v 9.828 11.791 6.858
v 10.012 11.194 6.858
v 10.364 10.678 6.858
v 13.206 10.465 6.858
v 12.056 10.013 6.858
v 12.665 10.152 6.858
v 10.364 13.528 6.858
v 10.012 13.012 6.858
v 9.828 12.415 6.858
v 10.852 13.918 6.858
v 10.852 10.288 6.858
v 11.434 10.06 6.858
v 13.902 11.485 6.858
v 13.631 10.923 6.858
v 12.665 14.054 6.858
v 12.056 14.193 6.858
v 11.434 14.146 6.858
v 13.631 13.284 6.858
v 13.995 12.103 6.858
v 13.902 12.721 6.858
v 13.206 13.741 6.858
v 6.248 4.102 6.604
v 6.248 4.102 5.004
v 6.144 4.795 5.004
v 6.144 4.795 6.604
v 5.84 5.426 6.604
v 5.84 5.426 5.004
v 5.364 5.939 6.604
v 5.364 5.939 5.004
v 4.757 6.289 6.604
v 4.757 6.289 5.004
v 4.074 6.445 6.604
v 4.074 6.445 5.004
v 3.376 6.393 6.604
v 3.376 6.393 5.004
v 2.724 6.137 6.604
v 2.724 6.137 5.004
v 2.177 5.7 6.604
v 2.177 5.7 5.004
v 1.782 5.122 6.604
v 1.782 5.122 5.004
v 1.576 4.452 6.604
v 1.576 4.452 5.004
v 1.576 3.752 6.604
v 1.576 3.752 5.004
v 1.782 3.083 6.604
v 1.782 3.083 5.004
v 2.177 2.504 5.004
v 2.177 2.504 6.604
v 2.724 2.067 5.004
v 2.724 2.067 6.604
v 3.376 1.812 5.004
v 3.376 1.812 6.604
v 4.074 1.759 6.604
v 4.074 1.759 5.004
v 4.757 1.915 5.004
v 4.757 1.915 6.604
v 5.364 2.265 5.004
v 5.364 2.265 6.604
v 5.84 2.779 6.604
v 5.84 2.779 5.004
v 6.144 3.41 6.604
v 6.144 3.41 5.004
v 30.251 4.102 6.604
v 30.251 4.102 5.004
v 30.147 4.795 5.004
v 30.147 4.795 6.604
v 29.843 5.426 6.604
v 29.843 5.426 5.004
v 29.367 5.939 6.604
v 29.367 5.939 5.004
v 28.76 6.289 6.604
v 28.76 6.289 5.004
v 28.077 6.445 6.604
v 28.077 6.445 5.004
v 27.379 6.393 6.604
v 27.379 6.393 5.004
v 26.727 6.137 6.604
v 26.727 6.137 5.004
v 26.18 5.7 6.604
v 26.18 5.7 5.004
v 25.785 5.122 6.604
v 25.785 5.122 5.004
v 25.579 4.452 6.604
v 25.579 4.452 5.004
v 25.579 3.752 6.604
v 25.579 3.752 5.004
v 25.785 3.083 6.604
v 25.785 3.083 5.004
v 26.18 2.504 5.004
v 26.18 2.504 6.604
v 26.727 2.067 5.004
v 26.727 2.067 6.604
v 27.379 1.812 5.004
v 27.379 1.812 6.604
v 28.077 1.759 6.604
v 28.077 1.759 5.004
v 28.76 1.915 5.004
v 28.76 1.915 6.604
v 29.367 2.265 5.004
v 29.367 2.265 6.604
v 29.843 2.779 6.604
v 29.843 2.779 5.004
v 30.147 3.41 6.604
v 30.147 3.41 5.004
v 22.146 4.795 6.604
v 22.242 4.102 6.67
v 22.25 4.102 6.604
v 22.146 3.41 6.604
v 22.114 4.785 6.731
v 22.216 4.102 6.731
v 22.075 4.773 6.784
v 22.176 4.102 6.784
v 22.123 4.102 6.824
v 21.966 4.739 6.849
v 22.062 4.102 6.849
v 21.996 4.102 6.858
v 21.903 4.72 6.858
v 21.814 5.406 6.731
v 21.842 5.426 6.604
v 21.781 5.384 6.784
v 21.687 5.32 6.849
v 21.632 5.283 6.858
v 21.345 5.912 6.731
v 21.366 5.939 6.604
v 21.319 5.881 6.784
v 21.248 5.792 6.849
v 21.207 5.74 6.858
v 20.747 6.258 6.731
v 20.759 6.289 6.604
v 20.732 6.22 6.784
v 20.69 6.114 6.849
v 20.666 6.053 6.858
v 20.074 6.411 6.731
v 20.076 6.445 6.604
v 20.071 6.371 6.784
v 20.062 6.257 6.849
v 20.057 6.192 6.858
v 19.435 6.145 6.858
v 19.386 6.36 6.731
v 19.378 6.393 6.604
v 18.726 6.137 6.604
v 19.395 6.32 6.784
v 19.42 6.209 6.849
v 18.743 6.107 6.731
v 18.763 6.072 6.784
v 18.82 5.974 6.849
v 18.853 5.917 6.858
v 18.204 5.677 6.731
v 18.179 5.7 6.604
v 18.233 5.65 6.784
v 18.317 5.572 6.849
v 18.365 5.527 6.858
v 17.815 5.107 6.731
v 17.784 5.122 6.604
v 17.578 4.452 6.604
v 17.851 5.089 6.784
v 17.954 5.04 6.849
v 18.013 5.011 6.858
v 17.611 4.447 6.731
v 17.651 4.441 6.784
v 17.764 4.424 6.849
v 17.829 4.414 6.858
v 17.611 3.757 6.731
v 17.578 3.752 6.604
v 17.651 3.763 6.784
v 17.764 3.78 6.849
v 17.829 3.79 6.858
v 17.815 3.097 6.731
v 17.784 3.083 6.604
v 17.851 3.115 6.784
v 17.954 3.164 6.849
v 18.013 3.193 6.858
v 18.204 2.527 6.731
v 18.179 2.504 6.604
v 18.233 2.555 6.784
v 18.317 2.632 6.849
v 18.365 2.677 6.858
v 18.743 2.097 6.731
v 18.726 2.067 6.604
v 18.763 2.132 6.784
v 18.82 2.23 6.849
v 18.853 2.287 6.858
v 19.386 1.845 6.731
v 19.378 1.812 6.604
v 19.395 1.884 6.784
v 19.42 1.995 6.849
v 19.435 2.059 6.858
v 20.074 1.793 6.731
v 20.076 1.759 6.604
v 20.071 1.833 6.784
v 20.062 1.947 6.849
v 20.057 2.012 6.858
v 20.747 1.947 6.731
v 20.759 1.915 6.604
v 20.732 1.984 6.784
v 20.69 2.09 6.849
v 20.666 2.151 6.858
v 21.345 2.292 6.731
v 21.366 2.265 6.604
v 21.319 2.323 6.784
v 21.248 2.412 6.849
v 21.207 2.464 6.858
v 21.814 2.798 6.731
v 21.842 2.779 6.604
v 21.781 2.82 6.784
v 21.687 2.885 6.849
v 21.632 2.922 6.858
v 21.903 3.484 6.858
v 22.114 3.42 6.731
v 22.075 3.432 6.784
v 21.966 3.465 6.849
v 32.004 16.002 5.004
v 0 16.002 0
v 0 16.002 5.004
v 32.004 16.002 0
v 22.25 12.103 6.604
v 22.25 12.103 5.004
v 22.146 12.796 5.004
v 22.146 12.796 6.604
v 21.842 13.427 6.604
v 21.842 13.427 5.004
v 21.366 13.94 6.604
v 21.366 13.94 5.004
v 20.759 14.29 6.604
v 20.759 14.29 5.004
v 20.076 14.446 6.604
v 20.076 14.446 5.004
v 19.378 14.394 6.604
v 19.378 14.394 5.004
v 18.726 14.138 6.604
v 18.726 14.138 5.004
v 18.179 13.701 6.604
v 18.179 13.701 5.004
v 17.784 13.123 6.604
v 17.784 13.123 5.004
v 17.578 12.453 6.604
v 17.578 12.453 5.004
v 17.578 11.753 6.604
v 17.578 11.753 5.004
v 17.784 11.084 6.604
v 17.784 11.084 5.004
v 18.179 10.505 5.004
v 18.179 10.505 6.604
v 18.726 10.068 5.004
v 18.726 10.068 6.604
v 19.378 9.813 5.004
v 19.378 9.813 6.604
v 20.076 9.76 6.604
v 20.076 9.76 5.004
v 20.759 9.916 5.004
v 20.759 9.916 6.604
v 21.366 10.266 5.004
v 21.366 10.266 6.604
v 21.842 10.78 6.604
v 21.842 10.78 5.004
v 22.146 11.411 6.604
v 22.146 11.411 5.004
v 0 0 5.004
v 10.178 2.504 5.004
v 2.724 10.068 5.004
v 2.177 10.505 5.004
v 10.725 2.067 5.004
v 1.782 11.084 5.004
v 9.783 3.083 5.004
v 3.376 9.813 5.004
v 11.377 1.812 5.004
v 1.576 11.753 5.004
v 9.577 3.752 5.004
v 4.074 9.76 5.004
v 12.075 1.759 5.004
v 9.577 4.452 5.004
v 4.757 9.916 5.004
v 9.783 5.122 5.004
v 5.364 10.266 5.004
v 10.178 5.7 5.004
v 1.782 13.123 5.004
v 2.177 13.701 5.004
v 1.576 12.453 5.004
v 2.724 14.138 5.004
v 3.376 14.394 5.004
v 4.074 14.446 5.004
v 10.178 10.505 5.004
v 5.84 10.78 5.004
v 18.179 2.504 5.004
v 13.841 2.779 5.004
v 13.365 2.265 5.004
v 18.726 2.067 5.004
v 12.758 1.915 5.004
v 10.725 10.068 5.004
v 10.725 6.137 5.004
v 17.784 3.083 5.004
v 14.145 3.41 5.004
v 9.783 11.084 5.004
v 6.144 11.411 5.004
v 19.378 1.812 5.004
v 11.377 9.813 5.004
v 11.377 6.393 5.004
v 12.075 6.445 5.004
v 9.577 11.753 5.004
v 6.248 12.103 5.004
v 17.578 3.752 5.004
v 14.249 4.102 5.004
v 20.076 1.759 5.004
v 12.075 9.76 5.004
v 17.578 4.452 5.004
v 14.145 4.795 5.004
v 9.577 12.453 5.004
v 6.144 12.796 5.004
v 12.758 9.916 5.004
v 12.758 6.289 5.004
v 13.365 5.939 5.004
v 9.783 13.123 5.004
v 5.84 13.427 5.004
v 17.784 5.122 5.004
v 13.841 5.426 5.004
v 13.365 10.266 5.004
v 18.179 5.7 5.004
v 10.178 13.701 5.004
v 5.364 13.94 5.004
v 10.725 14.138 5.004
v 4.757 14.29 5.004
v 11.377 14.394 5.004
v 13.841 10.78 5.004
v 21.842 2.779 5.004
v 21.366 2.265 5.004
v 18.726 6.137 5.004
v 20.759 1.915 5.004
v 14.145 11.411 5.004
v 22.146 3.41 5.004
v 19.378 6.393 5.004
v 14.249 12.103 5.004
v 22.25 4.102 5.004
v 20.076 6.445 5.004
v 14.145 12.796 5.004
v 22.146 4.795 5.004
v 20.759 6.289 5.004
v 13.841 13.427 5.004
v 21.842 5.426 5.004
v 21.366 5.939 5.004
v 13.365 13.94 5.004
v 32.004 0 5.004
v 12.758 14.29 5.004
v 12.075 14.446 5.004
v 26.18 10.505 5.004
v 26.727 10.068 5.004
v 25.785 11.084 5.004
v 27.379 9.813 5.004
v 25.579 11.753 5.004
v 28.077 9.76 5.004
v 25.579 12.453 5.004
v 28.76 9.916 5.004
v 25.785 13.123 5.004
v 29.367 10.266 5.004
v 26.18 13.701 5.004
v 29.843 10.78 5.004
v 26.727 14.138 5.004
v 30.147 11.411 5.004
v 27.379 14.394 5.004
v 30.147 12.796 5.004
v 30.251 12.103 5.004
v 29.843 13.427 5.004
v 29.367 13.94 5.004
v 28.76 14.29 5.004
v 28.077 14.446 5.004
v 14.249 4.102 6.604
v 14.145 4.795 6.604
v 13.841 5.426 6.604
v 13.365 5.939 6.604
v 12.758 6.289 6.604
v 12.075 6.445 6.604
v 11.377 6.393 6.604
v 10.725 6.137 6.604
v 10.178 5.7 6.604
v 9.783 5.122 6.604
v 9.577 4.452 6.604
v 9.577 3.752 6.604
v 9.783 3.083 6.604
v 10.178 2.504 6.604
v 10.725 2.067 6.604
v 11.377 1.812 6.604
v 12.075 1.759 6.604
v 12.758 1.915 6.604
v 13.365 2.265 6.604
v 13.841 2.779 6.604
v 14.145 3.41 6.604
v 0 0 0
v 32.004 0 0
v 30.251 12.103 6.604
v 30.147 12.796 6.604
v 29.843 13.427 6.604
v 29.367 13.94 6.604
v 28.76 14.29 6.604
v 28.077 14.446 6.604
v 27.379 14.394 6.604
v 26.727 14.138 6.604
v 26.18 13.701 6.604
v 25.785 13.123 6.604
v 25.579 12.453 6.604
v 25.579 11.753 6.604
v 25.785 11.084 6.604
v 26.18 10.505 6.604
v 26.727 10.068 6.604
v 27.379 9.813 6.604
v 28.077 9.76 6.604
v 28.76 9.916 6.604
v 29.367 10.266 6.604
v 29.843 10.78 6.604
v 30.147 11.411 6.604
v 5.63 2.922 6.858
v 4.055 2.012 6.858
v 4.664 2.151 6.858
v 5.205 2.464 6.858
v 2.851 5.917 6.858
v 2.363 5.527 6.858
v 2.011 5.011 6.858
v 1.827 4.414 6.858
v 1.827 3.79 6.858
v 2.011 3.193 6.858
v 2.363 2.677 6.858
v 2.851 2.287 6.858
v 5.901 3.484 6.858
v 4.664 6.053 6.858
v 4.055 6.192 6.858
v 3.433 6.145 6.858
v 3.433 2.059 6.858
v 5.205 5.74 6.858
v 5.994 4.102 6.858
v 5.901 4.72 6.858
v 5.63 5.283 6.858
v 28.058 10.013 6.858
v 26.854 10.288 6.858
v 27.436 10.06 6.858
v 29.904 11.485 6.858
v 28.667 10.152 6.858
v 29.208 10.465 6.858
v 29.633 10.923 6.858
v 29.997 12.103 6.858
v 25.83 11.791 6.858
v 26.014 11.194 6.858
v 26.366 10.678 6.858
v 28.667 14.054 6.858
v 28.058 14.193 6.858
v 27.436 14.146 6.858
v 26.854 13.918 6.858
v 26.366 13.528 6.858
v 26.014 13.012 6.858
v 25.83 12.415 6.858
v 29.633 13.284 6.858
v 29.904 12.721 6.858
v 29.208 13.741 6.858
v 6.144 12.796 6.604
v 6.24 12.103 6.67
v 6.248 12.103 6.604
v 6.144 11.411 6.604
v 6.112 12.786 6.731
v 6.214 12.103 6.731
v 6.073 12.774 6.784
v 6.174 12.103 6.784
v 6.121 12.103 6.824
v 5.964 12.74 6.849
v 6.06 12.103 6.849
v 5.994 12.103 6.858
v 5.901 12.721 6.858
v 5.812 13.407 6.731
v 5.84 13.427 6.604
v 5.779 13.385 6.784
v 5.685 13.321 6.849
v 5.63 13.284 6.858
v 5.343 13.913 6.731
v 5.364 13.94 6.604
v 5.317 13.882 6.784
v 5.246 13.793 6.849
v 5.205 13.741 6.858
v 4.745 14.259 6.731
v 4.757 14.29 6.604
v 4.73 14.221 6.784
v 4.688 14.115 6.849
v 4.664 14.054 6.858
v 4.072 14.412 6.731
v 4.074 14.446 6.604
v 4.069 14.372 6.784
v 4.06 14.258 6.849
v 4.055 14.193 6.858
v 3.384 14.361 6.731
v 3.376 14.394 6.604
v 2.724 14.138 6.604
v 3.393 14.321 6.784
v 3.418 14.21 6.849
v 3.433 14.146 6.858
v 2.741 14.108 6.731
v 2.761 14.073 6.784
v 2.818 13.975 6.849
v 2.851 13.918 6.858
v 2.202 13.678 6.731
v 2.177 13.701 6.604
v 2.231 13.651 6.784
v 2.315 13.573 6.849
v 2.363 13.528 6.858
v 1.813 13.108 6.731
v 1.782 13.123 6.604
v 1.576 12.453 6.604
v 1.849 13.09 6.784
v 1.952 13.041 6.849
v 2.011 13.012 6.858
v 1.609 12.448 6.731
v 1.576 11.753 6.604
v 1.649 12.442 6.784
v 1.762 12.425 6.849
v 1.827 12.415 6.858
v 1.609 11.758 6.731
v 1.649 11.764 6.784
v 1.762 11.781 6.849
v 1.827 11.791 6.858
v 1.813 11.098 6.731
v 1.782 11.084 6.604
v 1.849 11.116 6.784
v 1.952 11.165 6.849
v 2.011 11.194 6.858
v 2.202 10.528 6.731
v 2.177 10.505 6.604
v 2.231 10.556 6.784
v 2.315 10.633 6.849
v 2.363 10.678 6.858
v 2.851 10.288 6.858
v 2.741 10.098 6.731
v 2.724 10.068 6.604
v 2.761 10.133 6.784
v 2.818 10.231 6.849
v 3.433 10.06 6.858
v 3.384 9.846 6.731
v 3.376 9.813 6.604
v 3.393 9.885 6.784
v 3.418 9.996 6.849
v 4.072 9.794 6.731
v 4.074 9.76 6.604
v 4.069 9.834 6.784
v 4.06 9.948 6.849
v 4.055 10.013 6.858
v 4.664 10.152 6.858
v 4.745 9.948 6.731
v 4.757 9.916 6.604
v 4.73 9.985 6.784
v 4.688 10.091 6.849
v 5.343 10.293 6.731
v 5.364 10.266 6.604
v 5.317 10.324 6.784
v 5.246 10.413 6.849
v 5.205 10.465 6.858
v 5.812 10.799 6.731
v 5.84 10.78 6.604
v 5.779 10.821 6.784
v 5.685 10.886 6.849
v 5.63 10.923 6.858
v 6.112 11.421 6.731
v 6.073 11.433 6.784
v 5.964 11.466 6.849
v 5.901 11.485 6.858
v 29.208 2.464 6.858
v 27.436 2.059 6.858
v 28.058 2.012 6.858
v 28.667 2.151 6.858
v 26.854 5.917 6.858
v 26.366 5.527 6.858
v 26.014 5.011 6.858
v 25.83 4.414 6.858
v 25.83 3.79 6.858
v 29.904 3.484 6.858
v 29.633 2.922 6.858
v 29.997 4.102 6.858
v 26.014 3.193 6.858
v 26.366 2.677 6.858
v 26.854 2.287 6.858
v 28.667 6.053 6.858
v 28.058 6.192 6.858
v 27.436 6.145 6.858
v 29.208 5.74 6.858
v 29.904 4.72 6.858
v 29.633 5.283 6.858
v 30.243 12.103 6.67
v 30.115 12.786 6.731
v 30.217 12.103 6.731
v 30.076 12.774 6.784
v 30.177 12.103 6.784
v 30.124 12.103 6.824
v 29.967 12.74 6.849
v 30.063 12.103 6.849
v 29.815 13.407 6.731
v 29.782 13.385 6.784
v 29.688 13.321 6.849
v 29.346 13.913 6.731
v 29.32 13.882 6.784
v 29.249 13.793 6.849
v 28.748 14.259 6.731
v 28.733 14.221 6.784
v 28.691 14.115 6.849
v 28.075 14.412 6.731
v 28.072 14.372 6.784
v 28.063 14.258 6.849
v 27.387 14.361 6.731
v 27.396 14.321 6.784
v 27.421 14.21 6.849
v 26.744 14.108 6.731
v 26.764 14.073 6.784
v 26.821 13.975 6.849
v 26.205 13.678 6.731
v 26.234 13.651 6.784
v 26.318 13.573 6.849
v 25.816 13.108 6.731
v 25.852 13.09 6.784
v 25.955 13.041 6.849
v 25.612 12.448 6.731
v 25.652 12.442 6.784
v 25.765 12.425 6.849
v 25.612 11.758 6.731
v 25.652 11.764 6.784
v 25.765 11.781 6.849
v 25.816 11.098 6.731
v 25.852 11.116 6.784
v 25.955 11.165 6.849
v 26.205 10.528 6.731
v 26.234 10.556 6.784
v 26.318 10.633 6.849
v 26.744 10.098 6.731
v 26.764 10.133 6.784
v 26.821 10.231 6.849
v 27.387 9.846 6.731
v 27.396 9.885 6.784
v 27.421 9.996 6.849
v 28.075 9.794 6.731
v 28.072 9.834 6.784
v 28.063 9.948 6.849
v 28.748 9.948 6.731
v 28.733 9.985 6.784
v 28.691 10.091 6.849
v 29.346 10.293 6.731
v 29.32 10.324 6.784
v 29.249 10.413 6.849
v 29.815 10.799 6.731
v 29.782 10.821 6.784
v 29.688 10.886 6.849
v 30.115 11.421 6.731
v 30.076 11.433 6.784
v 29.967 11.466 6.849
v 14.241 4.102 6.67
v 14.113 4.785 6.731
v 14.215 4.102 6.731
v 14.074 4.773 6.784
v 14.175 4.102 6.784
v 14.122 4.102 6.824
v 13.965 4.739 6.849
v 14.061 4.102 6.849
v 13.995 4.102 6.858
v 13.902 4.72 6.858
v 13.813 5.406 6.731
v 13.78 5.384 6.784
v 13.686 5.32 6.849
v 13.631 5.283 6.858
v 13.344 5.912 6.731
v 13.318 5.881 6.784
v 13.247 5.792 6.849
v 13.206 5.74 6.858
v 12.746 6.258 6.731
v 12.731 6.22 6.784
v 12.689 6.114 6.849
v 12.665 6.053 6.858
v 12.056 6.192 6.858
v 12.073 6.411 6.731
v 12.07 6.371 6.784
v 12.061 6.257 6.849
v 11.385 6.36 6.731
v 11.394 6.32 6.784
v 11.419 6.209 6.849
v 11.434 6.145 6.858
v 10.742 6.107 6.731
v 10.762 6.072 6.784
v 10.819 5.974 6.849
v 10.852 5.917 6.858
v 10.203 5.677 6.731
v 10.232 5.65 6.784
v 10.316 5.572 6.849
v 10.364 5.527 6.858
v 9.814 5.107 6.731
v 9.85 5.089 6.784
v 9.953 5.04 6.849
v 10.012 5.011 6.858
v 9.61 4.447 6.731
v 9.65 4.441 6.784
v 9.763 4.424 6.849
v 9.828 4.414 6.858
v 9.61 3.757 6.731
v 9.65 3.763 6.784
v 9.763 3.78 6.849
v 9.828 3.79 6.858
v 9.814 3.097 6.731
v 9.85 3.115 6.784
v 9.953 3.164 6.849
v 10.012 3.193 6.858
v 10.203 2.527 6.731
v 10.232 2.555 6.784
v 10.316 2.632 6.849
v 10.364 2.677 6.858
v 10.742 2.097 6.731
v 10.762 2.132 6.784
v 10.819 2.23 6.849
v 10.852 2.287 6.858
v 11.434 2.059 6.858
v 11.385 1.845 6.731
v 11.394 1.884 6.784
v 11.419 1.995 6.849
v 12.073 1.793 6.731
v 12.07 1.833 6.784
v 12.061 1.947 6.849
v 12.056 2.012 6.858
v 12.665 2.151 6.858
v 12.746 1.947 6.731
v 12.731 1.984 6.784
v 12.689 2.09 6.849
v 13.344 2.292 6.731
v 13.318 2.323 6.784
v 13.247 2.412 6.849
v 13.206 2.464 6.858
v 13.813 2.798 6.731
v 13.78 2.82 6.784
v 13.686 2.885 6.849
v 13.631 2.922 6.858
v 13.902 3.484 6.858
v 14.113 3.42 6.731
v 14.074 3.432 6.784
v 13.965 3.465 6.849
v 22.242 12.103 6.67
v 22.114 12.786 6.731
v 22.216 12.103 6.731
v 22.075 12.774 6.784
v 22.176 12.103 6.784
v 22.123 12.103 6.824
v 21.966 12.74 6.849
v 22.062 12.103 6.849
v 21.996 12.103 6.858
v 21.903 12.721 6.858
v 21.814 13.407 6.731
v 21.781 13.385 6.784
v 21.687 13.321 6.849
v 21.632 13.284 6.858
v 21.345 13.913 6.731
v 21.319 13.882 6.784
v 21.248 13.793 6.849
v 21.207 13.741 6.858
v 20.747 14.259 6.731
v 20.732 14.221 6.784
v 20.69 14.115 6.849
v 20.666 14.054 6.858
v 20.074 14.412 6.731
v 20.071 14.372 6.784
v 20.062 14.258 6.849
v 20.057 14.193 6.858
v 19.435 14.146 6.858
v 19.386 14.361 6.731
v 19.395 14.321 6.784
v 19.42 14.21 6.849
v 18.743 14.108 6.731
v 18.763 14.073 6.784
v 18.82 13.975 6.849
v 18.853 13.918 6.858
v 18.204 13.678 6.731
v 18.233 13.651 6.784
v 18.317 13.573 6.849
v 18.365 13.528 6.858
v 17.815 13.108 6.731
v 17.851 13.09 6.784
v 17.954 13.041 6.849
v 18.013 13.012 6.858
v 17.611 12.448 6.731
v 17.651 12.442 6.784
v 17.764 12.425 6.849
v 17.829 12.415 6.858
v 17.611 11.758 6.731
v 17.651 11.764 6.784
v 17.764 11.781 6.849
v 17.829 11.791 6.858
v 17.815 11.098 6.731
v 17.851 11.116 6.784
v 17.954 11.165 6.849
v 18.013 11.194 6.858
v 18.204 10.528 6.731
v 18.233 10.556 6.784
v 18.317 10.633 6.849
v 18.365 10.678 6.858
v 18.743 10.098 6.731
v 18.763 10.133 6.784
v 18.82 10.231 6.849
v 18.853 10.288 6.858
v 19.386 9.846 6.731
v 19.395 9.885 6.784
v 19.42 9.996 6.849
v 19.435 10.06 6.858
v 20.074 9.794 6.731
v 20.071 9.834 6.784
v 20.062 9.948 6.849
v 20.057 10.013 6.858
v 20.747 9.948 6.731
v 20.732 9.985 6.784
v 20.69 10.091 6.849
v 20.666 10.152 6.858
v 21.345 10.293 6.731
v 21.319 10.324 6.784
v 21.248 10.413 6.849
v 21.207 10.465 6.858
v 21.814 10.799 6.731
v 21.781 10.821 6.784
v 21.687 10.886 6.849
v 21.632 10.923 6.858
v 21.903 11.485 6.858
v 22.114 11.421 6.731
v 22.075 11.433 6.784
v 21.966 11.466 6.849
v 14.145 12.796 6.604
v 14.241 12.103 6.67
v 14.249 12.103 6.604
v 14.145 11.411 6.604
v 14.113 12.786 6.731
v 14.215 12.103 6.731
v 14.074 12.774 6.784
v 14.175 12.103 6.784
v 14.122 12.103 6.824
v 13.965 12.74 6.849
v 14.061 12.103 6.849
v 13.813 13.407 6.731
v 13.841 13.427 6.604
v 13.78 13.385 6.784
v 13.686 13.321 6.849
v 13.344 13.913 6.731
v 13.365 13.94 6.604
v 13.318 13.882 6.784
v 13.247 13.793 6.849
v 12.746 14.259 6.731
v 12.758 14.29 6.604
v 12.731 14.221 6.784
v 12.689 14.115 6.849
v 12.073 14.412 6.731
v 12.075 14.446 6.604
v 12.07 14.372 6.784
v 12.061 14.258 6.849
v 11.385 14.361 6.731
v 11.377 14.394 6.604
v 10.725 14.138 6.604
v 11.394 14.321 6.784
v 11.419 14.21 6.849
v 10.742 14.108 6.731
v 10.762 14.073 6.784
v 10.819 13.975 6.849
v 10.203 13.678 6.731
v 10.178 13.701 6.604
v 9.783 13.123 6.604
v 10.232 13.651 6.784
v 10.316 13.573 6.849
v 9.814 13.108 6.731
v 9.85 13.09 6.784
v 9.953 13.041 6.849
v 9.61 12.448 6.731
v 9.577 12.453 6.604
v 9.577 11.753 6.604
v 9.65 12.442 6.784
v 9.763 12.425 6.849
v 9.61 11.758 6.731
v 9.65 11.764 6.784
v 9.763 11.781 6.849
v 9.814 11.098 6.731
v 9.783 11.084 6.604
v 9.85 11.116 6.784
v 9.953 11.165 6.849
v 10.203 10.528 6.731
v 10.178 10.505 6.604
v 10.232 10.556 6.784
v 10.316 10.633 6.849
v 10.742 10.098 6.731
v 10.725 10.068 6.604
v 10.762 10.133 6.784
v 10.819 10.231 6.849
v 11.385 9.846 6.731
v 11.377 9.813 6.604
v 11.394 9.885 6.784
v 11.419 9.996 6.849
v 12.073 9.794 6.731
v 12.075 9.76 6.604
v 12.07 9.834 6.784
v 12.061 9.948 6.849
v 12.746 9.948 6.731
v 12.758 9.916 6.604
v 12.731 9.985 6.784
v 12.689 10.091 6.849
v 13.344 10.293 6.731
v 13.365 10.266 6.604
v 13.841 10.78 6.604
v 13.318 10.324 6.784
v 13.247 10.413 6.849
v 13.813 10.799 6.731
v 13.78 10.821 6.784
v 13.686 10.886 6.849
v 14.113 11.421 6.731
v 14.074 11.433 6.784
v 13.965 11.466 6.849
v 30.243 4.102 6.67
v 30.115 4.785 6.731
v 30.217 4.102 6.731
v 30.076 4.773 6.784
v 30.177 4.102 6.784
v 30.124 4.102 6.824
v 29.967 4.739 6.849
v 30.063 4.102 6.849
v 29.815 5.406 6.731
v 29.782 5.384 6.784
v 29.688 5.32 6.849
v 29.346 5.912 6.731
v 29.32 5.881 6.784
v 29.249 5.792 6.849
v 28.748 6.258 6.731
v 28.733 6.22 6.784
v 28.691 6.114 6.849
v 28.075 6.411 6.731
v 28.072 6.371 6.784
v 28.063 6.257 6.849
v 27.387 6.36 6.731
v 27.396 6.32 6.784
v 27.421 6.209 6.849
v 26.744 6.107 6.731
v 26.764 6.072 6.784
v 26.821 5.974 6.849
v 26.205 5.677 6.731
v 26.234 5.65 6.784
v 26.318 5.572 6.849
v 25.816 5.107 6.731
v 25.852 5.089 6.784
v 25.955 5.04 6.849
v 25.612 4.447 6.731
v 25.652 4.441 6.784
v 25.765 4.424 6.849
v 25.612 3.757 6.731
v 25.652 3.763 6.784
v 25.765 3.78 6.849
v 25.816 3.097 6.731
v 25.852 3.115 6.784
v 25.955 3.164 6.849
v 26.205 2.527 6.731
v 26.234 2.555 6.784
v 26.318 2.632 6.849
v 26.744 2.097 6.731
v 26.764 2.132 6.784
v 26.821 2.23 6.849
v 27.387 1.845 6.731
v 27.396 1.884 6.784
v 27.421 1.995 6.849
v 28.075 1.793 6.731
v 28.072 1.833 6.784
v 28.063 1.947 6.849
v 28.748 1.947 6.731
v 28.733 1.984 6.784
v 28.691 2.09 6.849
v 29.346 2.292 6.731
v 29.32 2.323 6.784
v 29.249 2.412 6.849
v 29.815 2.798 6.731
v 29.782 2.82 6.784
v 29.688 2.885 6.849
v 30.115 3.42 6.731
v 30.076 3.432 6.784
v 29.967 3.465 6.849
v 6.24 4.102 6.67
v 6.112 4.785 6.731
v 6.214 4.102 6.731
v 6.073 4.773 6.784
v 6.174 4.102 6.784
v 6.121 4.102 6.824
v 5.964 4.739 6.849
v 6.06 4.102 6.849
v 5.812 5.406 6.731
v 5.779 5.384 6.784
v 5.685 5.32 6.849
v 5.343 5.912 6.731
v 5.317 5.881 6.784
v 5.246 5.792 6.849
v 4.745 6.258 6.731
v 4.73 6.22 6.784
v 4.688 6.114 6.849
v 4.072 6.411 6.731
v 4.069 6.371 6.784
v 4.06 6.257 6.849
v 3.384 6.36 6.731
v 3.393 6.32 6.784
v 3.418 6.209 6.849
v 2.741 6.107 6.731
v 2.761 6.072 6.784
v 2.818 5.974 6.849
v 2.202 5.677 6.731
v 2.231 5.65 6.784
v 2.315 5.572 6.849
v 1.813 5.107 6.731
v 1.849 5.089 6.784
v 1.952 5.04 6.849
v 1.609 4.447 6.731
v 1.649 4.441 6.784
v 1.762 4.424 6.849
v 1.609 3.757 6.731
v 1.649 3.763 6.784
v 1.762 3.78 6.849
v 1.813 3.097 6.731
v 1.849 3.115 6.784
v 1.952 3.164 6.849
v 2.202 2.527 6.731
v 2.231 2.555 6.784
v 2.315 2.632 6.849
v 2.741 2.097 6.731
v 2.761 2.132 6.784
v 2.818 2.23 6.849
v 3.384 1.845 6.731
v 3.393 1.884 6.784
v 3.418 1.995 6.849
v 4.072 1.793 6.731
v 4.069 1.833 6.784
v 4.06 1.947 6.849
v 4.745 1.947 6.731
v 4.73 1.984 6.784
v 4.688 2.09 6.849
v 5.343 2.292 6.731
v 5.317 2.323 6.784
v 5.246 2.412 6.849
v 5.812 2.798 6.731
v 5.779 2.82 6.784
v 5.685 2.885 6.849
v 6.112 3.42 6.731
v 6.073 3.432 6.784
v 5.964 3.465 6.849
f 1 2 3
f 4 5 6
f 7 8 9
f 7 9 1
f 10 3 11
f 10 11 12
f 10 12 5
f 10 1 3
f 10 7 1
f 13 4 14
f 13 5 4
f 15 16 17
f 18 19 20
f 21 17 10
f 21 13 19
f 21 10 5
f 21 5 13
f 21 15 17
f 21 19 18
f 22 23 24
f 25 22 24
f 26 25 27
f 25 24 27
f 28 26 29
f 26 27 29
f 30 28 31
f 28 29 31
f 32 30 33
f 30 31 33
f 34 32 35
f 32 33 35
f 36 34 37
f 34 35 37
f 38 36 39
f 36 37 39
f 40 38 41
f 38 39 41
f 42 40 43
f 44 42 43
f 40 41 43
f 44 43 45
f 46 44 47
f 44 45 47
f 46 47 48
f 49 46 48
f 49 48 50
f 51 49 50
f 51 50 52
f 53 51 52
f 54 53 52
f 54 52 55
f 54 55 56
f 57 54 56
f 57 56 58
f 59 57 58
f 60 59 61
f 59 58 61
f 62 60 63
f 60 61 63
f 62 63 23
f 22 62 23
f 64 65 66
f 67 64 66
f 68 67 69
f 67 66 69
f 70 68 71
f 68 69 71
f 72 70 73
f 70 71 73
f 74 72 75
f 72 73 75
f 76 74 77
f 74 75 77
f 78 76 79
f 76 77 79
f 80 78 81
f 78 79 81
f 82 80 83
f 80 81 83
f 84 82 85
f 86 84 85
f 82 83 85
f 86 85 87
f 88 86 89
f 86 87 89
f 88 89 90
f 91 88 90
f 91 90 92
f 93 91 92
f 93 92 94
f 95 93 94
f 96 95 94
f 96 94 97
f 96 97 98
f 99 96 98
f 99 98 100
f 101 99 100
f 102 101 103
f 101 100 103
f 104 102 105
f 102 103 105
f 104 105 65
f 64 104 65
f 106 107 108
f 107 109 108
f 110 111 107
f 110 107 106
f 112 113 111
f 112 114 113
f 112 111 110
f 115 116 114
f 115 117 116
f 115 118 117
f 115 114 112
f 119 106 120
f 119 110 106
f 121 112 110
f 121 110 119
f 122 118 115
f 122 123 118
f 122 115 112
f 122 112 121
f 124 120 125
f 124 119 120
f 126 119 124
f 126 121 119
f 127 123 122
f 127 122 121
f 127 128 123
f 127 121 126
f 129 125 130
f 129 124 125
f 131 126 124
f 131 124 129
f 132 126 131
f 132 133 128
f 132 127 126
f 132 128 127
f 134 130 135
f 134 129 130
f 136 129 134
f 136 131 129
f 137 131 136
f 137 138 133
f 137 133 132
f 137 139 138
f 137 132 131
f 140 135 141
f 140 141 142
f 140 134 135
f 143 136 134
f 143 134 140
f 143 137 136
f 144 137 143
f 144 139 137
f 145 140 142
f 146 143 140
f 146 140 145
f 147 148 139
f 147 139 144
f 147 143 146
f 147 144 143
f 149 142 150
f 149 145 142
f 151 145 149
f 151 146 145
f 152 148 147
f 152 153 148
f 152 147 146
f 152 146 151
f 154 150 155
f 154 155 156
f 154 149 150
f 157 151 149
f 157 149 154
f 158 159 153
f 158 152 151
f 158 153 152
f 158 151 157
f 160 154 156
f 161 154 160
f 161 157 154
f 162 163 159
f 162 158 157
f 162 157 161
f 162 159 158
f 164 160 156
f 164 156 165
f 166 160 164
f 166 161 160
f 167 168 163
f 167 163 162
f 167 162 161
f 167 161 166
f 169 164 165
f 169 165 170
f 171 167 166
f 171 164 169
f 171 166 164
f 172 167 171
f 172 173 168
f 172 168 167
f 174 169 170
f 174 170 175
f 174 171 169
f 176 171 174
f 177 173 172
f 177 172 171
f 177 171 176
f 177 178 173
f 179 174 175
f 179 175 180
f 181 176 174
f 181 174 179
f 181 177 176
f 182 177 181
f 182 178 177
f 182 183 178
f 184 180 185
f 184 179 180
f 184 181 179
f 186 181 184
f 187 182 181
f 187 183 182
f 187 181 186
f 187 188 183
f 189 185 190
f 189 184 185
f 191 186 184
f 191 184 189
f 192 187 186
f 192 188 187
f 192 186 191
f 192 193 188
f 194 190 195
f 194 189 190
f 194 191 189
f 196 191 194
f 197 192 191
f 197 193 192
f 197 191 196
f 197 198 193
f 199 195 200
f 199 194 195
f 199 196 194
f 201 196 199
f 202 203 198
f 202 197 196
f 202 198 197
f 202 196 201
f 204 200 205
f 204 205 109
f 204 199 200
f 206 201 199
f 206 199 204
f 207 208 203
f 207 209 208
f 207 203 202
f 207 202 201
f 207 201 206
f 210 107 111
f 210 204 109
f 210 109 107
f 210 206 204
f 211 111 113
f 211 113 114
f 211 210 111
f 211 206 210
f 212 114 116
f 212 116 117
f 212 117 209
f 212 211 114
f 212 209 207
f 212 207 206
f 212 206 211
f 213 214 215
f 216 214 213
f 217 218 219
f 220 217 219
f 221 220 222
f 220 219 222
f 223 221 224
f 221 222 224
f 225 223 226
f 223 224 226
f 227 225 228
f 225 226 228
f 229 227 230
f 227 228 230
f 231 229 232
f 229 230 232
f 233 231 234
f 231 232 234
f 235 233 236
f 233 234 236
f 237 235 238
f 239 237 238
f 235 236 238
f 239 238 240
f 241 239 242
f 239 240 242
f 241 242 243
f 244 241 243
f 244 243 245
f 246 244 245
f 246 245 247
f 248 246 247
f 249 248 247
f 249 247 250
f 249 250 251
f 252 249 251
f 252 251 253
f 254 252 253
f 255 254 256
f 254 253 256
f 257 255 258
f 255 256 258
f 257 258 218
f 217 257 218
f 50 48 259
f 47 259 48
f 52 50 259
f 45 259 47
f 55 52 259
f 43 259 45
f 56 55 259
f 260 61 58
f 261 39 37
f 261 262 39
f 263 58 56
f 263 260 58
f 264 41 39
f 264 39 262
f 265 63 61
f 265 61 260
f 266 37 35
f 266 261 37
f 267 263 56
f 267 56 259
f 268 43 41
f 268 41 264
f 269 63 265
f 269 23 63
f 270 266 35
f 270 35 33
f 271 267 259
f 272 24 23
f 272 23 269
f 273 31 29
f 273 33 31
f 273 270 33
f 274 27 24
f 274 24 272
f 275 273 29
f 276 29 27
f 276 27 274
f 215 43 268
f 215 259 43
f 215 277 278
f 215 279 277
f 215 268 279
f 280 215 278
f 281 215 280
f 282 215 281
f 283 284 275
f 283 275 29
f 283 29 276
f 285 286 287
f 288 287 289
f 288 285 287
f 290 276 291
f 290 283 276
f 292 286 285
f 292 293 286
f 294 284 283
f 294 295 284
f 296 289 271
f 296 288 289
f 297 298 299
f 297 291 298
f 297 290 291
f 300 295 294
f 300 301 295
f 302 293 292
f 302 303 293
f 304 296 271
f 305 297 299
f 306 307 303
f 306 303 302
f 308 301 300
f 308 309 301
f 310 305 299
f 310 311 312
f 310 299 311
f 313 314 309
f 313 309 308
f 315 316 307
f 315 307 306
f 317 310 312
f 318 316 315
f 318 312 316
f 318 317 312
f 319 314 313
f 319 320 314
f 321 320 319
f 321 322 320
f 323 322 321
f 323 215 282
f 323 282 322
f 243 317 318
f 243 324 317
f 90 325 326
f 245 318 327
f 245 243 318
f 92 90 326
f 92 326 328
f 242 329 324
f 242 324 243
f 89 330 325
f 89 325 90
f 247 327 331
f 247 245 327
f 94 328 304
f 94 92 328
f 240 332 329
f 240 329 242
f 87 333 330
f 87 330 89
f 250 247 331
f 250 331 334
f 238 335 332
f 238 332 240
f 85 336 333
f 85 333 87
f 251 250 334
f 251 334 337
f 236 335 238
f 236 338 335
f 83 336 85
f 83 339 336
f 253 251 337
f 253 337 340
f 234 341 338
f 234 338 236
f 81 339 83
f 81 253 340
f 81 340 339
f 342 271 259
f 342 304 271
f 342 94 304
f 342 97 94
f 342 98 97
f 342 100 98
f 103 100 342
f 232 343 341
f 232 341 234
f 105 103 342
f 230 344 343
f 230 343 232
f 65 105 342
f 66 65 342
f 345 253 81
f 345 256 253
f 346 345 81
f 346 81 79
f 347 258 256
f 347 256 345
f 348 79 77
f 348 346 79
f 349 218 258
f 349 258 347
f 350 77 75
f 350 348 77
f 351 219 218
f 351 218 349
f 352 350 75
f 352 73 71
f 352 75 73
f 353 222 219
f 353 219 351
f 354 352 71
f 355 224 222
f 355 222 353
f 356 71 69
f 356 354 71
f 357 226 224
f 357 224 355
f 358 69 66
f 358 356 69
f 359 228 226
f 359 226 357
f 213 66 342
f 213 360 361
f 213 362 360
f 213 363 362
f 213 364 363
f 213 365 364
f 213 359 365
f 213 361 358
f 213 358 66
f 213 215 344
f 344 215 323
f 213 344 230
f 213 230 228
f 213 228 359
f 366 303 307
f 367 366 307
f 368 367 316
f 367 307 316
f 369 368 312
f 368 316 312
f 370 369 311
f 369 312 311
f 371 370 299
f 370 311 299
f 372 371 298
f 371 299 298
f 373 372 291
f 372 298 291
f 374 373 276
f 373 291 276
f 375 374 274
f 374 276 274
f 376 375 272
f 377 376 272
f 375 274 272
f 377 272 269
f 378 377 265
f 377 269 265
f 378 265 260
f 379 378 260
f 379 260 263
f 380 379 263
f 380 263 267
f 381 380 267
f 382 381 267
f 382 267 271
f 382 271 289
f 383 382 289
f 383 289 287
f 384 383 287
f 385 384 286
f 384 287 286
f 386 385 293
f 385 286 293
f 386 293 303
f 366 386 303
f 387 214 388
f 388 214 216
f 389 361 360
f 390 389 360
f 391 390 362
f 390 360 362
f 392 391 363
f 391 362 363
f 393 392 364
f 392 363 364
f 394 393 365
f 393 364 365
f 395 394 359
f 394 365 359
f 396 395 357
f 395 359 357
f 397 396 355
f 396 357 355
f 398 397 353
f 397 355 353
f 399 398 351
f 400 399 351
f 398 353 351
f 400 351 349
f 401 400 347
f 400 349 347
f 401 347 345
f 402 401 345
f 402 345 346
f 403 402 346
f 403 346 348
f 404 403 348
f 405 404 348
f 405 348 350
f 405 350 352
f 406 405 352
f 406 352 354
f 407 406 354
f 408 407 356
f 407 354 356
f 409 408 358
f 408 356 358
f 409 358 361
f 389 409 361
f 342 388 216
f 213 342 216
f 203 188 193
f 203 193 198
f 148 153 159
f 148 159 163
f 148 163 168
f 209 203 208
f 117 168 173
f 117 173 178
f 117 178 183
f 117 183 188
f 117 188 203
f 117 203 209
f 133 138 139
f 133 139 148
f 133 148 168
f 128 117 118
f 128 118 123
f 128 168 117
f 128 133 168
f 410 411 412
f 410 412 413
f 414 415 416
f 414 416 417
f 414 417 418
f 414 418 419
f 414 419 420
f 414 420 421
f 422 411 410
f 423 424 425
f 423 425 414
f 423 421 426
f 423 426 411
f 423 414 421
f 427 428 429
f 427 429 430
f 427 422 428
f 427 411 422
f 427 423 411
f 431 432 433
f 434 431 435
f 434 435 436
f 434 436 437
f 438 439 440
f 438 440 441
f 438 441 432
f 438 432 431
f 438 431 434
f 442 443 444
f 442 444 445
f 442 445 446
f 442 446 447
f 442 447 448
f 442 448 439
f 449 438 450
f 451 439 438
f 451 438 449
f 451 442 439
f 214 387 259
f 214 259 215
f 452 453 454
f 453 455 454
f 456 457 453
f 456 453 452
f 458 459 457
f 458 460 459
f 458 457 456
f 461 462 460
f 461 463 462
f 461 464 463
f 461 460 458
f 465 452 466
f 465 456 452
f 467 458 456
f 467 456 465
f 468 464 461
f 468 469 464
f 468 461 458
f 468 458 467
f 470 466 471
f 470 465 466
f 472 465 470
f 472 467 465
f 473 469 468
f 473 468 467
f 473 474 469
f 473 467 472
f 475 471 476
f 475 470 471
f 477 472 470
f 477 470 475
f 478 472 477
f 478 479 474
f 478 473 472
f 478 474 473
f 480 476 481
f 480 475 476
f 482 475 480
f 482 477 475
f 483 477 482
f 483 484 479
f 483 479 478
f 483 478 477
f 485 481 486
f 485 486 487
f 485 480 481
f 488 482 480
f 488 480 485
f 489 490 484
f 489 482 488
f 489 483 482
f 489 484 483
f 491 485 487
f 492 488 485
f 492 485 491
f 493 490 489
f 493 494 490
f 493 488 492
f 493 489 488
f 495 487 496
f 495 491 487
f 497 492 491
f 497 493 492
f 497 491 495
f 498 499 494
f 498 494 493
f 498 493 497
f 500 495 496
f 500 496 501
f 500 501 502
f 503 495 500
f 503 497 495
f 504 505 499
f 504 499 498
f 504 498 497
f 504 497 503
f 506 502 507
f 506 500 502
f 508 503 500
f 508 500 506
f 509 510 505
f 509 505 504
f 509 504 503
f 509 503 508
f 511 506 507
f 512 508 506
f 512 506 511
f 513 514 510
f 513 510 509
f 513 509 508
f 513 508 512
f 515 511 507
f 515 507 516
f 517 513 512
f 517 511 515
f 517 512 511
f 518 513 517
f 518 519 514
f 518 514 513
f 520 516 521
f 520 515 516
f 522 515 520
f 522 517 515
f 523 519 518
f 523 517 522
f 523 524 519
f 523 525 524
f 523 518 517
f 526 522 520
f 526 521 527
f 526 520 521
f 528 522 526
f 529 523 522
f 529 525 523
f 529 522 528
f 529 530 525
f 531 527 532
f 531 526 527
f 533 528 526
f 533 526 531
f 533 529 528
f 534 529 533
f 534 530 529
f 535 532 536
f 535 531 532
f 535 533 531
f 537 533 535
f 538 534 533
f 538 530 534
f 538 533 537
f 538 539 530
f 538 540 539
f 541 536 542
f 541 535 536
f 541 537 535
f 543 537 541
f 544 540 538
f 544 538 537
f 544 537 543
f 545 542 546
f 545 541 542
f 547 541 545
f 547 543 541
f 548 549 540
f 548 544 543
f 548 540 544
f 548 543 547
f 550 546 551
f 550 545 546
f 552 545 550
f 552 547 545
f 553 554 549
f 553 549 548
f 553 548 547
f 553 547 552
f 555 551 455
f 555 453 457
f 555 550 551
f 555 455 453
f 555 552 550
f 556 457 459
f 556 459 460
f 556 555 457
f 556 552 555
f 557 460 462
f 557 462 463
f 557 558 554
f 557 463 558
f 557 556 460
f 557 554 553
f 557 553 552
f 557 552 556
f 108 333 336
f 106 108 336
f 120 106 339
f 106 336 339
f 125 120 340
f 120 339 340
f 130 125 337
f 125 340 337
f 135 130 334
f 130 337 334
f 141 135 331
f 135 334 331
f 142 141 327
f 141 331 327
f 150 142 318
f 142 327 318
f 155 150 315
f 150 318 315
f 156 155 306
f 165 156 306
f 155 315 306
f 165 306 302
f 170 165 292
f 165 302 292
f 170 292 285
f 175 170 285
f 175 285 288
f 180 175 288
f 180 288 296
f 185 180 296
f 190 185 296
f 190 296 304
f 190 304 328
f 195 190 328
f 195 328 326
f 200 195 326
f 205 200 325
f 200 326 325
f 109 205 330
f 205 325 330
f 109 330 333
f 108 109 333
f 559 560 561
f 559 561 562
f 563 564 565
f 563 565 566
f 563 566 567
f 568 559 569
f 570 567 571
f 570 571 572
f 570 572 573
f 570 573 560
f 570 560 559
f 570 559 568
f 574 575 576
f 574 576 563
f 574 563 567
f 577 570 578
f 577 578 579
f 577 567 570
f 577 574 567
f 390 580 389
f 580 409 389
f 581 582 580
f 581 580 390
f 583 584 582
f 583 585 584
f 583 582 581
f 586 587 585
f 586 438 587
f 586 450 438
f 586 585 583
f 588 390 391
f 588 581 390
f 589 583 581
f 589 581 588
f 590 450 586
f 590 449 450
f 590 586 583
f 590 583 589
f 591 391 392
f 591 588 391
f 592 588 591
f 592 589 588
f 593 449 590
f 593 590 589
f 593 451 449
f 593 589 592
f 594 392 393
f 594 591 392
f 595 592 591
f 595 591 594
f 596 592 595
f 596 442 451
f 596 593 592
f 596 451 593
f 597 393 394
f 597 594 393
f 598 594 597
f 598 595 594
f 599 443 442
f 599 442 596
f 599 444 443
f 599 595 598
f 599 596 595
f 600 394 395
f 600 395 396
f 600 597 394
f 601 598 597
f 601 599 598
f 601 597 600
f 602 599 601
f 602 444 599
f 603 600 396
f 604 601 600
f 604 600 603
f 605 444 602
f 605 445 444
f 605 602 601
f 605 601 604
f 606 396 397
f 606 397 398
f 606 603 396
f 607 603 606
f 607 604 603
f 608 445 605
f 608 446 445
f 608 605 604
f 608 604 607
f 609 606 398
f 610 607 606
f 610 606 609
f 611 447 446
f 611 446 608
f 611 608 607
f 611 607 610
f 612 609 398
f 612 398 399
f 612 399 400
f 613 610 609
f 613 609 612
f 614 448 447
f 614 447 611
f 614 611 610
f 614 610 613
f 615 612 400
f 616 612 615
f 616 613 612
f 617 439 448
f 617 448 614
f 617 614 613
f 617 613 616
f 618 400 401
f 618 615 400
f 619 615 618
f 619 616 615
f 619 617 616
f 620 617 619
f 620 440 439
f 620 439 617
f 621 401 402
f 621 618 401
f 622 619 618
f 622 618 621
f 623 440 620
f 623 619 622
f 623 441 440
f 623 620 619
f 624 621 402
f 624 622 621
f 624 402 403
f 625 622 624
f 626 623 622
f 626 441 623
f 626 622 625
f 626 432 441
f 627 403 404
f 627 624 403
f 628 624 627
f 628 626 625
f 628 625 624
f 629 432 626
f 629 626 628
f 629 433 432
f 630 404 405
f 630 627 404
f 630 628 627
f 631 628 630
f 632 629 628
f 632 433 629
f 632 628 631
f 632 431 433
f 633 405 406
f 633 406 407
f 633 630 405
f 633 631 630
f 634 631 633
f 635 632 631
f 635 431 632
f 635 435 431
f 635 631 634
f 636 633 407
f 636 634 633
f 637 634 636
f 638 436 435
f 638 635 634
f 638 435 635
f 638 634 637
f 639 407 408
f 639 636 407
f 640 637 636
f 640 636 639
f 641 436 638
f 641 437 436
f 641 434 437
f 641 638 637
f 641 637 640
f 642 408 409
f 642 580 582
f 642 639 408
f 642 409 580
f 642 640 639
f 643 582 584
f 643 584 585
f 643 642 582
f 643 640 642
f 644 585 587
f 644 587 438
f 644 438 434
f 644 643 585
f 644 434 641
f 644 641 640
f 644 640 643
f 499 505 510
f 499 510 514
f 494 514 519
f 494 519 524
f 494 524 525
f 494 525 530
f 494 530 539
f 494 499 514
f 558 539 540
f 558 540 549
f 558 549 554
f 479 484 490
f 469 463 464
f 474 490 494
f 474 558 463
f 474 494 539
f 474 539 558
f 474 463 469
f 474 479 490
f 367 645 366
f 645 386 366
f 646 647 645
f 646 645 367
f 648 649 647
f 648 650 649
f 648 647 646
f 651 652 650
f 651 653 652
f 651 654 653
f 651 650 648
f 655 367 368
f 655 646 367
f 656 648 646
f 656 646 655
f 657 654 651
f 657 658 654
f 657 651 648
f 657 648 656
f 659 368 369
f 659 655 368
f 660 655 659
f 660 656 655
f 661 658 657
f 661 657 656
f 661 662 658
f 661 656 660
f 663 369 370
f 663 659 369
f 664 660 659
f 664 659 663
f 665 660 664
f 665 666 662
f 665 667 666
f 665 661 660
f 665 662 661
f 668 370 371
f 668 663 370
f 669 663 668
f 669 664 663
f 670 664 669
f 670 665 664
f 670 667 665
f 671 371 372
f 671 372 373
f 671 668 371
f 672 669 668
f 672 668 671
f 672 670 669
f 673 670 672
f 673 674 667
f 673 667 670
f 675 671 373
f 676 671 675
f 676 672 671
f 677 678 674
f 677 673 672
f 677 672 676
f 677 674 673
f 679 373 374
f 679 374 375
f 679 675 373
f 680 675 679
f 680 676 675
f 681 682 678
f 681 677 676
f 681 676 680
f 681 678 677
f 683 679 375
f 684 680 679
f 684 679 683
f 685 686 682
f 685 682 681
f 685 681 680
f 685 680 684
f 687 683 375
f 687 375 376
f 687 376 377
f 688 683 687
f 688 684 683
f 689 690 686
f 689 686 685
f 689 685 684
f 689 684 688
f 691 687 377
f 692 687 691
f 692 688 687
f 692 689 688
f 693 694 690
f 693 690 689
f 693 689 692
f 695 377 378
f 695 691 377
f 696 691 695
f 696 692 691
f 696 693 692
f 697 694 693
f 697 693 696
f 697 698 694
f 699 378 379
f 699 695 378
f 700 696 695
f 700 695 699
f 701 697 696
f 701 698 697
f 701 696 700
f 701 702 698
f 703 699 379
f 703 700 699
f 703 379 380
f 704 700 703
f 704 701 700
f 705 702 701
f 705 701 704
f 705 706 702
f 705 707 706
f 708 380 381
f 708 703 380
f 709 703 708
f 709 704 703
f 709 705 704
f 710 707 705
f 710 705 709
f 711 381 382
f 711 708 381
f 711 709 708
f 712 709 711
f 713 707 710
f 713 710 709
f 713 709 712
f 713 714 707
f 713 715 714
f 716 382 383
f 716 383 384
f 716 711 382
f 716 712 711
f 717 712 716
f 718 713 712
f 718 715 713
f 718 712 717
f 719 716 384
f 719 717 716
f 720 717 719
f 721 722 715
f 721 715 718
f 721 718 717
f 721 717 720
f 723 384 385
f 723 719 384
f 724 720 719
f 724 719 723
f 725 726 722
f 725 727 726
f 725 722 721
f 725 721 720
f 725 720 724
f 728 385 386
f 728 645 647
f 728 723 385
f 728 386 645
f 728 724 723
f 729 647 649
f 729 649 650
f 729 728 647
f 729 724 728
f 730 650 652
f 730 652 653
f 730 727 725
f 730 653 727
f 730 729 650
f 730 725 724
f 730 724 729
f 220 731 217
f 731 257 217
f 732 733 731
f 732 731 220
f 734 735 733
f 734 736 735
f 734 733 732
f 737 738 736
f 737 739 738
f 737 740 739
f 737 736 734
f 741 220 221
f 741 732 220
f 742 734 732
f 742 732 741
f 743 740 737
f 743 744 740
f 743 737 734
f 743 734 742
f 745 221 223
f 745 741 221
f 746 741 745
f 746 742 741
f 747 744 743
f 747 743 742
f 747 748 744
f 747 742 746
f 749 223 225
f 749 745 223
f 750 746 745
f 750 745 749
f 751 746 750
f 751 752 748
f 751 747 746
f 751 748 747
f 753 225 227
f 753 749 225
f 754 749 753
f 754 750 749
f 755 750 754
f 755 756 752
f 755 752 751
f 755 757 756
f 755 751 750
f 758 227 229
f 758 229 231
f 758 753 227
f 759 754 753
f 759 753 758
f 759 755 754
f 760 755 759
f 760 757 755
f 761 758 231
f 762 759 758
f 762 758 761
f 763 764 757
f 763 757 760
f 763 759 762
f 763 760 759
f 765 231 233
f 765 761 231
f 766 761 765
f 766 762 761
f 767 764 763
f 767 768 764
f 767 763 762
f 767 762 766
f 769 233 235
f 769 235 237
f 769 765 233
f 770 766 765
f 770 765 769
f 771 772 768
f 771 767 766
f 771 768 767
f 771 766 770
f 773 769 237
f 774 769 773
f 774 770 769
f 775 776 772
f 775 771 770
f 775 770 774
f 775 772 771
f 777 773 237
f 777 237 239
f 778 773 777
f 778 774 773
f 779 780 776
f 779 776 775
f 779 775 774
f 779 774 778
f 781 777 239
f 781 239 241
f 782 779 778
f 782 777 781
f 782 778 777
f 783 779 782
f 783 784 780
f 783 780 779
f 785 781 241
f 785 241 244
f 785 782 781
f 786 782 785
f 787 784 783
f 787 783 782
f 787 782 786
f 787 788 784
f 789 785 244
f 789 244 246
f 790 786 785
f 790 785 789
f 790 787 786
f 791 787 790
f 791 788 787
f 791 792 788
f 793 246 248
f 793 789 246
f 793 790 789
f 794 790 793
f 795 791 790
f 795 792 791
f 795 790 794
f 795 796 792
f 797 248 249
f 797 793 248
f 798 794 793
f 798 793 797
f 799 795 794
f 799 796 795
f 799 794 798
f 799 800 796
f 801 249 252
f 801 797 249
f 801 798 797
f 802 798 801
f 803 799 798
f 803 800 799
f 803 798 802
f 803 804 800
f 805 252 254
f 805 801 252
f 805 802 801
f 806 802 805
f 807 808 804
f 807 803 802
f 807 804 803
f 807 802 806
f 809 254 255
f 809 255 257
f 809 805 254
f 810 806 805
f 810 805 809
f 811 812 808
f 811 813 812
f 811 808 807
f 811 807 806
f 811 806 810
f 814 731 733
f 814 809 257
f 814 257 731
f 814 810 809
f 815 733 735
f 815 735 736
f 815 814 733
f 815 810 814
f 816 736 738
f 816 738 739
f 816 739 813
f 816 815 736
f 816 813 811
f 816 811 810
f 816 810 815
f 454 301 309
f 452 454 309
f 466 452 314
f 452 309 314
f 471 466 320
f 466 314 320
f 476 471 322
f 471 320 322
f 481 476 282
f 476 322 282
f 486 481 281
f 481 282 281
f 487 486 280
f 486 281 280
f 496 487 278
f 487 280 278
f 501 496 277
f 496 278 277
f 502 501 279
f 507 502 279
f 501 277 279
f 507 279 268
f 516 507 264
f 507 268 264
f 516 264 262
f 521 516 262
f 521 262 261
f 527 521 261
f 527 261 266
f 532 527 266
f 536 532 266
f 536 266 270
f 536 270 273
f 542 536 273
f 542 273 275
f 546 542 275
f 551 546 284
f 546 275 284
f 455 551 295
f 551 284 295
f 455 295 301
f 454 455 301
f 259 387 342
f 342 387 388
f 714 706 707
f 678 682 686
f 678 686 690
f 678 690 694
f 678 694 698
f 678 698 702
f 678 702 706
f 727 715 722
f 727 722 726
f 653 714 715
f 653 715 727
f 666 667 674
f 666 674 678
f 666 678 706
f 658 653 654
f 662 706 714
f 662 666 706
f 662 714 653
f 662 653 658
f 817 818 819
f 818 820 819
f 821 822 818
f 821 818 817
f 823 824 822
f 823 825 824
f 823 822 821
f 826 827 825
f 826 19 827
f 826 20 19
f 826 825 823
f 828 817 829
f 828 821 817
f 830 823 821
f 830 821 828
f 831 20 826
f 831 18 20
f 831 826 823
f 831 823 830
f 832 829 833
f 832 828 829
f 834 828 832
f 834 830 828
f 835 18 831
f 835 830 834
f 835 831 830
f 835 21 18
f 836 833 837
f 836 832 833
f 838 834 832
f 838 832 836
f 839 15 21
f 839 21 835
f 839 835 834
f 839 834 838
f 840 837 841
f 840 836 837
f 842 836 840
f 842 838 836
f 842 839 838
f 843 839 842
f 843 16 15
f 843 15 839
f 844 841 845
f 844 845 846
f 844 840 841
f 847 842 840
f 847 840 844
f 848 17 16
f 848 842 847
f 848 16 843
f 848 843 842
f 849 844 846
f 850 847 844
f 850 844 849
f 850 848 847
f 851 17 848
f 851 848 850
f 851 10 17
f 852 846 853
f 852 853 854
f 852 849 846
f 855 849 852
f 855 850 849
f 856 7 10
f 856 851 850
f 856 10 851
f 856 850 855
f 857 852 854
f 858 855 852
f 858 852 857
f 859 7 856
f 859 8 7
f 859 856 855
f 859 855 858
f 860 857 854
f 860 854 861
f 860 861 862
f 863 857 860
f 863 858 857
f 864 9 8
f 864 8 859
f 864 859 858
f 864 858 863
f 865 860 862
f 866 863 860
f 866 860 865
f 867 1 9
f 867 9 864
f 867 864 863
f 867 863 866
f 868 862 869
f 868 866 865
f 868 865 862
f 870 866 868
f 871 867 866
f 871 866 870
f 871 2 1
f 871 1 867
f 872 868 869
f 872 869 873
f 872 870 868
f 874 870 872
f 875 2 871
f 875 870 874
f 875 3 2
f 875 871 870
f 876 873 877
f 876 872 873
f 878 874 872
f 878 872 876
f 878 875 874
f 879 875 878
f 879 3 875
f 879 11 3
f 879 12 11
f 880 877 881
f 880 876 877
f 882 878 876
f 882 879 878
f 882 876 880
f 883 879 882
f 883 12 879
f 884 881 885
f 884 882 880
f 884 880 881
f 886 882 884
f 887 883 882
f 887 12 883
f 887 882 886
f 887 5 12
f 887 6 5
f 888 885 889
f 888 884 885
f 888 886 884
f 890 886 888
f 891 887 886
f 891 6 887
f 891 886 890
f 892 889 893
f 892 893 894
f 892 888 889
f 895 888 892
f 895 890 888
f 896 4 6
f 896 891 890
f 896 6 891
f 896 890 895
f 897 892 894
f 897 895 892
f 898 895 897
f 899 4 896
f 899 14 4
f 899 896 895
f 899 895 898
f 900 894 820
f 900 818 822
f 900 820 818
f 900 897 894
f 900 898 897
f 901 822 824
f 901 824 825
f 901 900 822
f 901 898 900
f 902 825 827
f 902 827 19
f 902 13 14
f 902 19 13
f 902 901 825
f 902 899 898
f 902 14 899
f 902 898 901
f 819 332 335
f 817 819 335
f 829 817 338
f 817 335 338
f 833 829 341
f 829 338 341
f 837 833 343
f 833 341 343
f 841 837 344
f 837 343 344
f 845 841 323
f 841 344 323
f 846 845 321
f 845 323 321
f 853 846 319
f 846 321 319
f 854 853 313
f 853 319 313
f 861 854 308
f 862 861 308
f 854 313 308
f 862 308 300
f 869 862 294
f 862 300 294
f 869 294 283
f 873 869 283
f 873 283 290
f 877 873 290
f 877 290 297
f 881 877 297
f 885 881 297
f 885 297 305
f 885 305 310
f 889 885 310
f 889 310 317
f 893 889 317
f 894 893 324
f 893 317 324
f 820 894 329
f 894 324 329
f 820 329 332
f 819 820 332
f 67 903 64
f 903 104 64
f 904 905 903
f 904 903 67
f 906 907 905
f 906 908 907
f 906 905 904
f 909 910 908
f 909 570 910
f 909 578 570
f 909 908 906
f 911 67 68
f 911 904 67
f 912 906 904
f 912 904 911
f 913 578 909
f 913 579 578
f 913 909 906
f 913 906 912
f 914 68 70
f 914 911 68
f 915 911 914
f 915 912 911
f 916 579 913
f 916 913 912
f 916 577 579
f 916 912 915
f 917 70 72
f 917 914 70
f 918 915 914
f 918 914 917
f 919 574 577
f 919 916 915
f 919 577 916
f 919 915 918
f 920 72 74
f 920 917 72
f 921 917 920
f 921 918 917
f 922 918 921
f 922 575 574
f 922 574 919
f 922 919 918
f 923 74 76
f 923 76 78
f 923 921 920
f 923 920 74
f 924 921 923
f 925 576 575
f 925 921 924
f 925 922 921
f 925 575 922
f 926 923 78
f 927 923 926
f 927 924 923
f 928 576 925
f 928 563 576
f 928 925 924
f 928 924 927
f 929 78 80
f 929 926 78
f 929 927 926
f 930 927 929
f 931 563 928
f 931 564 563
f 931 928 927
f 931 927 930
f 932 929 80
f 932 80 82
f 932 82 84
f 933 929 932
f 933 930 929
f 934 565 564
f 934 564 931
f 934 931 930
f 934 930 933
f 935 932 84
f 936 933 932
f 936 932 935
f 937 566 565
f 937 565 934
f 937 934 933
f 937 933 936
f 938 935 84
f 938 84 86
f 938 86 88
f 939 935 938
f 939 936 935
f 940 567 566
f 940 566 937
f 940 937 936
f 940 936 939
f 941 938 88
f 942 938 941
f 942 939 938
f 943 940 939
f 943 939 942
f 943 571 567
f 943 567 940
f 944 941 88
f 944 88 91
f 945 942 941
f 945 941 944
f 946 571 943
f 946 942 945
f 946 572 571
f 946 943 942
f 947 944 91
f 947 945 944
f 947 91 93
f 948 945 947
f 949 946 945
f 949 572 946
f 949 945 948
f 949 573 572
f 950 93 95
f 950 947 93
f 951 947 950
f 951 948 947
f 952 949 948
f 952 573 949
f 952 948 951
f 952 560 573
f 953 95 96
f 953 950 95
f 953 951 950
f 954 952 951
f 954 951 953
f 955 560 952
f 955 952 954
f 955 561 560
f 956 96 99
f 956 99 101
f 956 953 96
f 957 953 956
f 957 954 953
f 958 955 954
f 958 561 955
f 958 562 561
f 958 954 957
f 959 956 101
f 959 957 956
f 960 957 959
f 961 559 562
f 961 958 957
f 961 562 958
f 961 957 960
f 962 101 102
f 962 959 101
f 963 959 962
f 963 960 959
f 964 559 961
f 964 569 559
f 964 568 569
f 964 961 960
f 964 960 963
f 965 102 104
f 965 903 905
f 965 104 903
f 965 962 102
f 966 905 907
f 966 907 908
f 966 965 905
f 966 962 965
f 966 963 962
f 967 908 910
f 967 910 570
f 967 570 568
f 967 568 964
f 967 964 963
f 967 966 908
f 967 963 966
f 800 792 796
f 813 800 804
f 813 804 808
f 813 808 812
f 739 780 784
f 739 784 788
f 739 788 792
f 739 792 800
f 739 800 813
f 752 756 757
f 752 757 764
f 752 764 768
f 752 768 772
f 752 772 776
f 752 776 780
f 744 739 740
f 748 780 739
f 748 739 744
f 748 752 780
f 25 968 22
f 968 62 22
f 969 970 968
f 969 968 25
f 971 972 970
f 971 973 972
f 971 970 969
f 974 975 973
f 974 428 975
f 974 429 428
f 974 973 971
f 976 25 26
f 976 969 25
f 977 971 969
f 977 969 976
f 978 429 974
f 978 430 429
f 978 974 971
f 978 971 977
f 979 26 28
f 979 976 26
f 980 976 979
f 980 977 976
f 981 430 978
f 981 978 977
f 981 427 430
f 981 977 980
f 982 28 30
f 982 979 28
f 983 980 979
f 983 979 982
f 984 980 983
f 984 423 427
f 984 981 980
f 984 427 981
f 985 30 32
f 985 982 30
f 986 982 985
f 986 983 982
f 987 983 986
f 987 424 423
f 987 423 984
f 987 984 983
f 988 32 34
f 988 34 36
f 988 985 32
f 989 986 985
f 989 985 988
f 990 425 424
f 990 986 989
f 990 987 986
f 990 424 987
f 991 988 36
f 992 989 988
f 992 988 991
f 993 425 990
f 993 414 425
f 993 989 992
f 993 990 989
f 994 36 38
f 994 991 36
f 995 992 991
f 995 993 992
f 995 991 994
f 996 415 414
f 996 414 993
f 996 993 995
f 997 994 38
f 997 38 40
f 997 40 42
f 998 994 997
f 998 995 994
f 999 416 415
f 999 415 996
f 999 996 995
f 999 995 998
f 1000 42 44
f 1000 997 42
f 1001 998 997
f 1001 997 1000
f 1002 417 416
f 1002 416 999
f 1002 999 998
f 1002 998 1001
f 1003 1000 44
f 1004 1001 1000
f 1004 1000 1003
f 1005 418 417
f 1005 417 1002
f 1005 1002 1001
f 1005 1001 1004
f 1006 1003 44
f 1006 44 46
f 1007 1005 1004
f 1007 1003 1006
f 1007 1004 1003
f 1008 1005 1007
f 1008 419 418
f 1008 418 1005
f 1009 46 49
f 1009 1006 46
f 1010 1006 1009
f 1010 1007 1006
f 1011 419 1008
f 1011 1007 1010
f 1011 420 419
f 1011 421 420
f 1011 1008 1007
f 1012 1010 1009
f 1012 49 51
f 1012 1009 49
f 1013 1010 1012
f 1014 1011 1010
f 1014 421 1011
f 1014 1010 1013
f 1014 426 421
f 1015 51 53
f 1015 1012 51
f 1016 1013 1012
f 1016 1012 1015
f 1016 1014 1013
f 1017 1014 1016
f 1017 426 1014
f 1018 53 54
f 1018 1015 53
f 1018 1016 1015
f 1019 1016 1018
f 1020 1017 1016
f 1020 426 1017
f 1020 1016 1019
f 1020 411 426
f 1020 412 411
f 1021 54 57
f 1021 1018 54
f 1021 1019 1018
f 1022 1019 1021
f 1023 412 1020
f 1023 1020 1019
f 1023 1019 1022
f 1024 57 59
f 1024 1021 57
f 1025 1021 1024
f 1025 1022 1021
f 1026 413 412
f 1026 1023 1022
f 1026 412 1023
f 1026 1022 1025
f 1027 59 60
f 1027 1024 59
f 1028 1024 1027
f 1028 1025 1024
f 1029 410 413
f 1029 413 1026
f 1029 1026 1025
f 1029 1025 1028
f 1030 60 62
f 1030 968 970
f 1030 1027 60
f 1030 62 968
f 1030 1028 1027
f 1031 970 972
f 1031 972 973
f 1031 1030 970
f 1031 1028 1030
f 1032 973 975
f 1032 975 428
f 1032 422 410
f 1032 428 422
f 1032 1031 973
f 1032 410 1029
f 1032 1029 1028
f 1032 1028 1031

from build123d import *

# Parameters (mm, degrees)
F0_W     = 32.004
F0_H     = 16.002
F1_DEPTH = 5.0038
F2_R     = 2.3495
F3_DEPTH = 1.8542
F4_R     = 0.254


with BuildPart() as f1:
    # F0 (on Top) → F1 (new body)
    with BuildSketch(Plane.XY):
        with Locations((16.002, 8.001)):
            Rectangle(F0_W, F0_H)
    extrude(amount=F1_DEPTH)

    # F2 (on face) → F3 (join)
    with BuildSketch(Plane.XY.offset(5.0038)):
        with Locations((3.8989, 4.1021)):
            Circle(F2_R)
        with Locations((3.8989, 12.1031)):
            Circle(F2_R)
        with Locations((11.8999, 12.1031)):
            Circle(F2_R)
        with Locations((11.8999, 4.1021)):
            Circle(F2_R)
        with Locations((19.9009, 4.1021)):
            Circle(F2_R)
        with Locations((19.9009, 12.1031)):
            Circle(F2_R)
        with Locations((27.9019, 12.1031)):
            Circle(F2_R)
        with Locations((27.9019, 4.1021)):
            Circle(F2_R)
    extrude(amount=F3_DEPTH)

    # F4
    f4_edges = [f1.edges().sort_by_distance(p)[0] for p in [
        (1.5494, 4.1021, 6.858),
        (1.5494, 12.1031, 6.858),
        (9.5504, 4.1021, 6.858),
        (9.5504, 12.1031, 6.858),
        (17.5514, 4.1021, 6.858),
        (17.5514, 12.1031, 6.858),
        (25.5524, 12.1031, 6.858),
        (25.5524, 4.1021, 6.858),
    ]]
    fillet(f4_edges, radius=F4_R)


solid = f1.part
